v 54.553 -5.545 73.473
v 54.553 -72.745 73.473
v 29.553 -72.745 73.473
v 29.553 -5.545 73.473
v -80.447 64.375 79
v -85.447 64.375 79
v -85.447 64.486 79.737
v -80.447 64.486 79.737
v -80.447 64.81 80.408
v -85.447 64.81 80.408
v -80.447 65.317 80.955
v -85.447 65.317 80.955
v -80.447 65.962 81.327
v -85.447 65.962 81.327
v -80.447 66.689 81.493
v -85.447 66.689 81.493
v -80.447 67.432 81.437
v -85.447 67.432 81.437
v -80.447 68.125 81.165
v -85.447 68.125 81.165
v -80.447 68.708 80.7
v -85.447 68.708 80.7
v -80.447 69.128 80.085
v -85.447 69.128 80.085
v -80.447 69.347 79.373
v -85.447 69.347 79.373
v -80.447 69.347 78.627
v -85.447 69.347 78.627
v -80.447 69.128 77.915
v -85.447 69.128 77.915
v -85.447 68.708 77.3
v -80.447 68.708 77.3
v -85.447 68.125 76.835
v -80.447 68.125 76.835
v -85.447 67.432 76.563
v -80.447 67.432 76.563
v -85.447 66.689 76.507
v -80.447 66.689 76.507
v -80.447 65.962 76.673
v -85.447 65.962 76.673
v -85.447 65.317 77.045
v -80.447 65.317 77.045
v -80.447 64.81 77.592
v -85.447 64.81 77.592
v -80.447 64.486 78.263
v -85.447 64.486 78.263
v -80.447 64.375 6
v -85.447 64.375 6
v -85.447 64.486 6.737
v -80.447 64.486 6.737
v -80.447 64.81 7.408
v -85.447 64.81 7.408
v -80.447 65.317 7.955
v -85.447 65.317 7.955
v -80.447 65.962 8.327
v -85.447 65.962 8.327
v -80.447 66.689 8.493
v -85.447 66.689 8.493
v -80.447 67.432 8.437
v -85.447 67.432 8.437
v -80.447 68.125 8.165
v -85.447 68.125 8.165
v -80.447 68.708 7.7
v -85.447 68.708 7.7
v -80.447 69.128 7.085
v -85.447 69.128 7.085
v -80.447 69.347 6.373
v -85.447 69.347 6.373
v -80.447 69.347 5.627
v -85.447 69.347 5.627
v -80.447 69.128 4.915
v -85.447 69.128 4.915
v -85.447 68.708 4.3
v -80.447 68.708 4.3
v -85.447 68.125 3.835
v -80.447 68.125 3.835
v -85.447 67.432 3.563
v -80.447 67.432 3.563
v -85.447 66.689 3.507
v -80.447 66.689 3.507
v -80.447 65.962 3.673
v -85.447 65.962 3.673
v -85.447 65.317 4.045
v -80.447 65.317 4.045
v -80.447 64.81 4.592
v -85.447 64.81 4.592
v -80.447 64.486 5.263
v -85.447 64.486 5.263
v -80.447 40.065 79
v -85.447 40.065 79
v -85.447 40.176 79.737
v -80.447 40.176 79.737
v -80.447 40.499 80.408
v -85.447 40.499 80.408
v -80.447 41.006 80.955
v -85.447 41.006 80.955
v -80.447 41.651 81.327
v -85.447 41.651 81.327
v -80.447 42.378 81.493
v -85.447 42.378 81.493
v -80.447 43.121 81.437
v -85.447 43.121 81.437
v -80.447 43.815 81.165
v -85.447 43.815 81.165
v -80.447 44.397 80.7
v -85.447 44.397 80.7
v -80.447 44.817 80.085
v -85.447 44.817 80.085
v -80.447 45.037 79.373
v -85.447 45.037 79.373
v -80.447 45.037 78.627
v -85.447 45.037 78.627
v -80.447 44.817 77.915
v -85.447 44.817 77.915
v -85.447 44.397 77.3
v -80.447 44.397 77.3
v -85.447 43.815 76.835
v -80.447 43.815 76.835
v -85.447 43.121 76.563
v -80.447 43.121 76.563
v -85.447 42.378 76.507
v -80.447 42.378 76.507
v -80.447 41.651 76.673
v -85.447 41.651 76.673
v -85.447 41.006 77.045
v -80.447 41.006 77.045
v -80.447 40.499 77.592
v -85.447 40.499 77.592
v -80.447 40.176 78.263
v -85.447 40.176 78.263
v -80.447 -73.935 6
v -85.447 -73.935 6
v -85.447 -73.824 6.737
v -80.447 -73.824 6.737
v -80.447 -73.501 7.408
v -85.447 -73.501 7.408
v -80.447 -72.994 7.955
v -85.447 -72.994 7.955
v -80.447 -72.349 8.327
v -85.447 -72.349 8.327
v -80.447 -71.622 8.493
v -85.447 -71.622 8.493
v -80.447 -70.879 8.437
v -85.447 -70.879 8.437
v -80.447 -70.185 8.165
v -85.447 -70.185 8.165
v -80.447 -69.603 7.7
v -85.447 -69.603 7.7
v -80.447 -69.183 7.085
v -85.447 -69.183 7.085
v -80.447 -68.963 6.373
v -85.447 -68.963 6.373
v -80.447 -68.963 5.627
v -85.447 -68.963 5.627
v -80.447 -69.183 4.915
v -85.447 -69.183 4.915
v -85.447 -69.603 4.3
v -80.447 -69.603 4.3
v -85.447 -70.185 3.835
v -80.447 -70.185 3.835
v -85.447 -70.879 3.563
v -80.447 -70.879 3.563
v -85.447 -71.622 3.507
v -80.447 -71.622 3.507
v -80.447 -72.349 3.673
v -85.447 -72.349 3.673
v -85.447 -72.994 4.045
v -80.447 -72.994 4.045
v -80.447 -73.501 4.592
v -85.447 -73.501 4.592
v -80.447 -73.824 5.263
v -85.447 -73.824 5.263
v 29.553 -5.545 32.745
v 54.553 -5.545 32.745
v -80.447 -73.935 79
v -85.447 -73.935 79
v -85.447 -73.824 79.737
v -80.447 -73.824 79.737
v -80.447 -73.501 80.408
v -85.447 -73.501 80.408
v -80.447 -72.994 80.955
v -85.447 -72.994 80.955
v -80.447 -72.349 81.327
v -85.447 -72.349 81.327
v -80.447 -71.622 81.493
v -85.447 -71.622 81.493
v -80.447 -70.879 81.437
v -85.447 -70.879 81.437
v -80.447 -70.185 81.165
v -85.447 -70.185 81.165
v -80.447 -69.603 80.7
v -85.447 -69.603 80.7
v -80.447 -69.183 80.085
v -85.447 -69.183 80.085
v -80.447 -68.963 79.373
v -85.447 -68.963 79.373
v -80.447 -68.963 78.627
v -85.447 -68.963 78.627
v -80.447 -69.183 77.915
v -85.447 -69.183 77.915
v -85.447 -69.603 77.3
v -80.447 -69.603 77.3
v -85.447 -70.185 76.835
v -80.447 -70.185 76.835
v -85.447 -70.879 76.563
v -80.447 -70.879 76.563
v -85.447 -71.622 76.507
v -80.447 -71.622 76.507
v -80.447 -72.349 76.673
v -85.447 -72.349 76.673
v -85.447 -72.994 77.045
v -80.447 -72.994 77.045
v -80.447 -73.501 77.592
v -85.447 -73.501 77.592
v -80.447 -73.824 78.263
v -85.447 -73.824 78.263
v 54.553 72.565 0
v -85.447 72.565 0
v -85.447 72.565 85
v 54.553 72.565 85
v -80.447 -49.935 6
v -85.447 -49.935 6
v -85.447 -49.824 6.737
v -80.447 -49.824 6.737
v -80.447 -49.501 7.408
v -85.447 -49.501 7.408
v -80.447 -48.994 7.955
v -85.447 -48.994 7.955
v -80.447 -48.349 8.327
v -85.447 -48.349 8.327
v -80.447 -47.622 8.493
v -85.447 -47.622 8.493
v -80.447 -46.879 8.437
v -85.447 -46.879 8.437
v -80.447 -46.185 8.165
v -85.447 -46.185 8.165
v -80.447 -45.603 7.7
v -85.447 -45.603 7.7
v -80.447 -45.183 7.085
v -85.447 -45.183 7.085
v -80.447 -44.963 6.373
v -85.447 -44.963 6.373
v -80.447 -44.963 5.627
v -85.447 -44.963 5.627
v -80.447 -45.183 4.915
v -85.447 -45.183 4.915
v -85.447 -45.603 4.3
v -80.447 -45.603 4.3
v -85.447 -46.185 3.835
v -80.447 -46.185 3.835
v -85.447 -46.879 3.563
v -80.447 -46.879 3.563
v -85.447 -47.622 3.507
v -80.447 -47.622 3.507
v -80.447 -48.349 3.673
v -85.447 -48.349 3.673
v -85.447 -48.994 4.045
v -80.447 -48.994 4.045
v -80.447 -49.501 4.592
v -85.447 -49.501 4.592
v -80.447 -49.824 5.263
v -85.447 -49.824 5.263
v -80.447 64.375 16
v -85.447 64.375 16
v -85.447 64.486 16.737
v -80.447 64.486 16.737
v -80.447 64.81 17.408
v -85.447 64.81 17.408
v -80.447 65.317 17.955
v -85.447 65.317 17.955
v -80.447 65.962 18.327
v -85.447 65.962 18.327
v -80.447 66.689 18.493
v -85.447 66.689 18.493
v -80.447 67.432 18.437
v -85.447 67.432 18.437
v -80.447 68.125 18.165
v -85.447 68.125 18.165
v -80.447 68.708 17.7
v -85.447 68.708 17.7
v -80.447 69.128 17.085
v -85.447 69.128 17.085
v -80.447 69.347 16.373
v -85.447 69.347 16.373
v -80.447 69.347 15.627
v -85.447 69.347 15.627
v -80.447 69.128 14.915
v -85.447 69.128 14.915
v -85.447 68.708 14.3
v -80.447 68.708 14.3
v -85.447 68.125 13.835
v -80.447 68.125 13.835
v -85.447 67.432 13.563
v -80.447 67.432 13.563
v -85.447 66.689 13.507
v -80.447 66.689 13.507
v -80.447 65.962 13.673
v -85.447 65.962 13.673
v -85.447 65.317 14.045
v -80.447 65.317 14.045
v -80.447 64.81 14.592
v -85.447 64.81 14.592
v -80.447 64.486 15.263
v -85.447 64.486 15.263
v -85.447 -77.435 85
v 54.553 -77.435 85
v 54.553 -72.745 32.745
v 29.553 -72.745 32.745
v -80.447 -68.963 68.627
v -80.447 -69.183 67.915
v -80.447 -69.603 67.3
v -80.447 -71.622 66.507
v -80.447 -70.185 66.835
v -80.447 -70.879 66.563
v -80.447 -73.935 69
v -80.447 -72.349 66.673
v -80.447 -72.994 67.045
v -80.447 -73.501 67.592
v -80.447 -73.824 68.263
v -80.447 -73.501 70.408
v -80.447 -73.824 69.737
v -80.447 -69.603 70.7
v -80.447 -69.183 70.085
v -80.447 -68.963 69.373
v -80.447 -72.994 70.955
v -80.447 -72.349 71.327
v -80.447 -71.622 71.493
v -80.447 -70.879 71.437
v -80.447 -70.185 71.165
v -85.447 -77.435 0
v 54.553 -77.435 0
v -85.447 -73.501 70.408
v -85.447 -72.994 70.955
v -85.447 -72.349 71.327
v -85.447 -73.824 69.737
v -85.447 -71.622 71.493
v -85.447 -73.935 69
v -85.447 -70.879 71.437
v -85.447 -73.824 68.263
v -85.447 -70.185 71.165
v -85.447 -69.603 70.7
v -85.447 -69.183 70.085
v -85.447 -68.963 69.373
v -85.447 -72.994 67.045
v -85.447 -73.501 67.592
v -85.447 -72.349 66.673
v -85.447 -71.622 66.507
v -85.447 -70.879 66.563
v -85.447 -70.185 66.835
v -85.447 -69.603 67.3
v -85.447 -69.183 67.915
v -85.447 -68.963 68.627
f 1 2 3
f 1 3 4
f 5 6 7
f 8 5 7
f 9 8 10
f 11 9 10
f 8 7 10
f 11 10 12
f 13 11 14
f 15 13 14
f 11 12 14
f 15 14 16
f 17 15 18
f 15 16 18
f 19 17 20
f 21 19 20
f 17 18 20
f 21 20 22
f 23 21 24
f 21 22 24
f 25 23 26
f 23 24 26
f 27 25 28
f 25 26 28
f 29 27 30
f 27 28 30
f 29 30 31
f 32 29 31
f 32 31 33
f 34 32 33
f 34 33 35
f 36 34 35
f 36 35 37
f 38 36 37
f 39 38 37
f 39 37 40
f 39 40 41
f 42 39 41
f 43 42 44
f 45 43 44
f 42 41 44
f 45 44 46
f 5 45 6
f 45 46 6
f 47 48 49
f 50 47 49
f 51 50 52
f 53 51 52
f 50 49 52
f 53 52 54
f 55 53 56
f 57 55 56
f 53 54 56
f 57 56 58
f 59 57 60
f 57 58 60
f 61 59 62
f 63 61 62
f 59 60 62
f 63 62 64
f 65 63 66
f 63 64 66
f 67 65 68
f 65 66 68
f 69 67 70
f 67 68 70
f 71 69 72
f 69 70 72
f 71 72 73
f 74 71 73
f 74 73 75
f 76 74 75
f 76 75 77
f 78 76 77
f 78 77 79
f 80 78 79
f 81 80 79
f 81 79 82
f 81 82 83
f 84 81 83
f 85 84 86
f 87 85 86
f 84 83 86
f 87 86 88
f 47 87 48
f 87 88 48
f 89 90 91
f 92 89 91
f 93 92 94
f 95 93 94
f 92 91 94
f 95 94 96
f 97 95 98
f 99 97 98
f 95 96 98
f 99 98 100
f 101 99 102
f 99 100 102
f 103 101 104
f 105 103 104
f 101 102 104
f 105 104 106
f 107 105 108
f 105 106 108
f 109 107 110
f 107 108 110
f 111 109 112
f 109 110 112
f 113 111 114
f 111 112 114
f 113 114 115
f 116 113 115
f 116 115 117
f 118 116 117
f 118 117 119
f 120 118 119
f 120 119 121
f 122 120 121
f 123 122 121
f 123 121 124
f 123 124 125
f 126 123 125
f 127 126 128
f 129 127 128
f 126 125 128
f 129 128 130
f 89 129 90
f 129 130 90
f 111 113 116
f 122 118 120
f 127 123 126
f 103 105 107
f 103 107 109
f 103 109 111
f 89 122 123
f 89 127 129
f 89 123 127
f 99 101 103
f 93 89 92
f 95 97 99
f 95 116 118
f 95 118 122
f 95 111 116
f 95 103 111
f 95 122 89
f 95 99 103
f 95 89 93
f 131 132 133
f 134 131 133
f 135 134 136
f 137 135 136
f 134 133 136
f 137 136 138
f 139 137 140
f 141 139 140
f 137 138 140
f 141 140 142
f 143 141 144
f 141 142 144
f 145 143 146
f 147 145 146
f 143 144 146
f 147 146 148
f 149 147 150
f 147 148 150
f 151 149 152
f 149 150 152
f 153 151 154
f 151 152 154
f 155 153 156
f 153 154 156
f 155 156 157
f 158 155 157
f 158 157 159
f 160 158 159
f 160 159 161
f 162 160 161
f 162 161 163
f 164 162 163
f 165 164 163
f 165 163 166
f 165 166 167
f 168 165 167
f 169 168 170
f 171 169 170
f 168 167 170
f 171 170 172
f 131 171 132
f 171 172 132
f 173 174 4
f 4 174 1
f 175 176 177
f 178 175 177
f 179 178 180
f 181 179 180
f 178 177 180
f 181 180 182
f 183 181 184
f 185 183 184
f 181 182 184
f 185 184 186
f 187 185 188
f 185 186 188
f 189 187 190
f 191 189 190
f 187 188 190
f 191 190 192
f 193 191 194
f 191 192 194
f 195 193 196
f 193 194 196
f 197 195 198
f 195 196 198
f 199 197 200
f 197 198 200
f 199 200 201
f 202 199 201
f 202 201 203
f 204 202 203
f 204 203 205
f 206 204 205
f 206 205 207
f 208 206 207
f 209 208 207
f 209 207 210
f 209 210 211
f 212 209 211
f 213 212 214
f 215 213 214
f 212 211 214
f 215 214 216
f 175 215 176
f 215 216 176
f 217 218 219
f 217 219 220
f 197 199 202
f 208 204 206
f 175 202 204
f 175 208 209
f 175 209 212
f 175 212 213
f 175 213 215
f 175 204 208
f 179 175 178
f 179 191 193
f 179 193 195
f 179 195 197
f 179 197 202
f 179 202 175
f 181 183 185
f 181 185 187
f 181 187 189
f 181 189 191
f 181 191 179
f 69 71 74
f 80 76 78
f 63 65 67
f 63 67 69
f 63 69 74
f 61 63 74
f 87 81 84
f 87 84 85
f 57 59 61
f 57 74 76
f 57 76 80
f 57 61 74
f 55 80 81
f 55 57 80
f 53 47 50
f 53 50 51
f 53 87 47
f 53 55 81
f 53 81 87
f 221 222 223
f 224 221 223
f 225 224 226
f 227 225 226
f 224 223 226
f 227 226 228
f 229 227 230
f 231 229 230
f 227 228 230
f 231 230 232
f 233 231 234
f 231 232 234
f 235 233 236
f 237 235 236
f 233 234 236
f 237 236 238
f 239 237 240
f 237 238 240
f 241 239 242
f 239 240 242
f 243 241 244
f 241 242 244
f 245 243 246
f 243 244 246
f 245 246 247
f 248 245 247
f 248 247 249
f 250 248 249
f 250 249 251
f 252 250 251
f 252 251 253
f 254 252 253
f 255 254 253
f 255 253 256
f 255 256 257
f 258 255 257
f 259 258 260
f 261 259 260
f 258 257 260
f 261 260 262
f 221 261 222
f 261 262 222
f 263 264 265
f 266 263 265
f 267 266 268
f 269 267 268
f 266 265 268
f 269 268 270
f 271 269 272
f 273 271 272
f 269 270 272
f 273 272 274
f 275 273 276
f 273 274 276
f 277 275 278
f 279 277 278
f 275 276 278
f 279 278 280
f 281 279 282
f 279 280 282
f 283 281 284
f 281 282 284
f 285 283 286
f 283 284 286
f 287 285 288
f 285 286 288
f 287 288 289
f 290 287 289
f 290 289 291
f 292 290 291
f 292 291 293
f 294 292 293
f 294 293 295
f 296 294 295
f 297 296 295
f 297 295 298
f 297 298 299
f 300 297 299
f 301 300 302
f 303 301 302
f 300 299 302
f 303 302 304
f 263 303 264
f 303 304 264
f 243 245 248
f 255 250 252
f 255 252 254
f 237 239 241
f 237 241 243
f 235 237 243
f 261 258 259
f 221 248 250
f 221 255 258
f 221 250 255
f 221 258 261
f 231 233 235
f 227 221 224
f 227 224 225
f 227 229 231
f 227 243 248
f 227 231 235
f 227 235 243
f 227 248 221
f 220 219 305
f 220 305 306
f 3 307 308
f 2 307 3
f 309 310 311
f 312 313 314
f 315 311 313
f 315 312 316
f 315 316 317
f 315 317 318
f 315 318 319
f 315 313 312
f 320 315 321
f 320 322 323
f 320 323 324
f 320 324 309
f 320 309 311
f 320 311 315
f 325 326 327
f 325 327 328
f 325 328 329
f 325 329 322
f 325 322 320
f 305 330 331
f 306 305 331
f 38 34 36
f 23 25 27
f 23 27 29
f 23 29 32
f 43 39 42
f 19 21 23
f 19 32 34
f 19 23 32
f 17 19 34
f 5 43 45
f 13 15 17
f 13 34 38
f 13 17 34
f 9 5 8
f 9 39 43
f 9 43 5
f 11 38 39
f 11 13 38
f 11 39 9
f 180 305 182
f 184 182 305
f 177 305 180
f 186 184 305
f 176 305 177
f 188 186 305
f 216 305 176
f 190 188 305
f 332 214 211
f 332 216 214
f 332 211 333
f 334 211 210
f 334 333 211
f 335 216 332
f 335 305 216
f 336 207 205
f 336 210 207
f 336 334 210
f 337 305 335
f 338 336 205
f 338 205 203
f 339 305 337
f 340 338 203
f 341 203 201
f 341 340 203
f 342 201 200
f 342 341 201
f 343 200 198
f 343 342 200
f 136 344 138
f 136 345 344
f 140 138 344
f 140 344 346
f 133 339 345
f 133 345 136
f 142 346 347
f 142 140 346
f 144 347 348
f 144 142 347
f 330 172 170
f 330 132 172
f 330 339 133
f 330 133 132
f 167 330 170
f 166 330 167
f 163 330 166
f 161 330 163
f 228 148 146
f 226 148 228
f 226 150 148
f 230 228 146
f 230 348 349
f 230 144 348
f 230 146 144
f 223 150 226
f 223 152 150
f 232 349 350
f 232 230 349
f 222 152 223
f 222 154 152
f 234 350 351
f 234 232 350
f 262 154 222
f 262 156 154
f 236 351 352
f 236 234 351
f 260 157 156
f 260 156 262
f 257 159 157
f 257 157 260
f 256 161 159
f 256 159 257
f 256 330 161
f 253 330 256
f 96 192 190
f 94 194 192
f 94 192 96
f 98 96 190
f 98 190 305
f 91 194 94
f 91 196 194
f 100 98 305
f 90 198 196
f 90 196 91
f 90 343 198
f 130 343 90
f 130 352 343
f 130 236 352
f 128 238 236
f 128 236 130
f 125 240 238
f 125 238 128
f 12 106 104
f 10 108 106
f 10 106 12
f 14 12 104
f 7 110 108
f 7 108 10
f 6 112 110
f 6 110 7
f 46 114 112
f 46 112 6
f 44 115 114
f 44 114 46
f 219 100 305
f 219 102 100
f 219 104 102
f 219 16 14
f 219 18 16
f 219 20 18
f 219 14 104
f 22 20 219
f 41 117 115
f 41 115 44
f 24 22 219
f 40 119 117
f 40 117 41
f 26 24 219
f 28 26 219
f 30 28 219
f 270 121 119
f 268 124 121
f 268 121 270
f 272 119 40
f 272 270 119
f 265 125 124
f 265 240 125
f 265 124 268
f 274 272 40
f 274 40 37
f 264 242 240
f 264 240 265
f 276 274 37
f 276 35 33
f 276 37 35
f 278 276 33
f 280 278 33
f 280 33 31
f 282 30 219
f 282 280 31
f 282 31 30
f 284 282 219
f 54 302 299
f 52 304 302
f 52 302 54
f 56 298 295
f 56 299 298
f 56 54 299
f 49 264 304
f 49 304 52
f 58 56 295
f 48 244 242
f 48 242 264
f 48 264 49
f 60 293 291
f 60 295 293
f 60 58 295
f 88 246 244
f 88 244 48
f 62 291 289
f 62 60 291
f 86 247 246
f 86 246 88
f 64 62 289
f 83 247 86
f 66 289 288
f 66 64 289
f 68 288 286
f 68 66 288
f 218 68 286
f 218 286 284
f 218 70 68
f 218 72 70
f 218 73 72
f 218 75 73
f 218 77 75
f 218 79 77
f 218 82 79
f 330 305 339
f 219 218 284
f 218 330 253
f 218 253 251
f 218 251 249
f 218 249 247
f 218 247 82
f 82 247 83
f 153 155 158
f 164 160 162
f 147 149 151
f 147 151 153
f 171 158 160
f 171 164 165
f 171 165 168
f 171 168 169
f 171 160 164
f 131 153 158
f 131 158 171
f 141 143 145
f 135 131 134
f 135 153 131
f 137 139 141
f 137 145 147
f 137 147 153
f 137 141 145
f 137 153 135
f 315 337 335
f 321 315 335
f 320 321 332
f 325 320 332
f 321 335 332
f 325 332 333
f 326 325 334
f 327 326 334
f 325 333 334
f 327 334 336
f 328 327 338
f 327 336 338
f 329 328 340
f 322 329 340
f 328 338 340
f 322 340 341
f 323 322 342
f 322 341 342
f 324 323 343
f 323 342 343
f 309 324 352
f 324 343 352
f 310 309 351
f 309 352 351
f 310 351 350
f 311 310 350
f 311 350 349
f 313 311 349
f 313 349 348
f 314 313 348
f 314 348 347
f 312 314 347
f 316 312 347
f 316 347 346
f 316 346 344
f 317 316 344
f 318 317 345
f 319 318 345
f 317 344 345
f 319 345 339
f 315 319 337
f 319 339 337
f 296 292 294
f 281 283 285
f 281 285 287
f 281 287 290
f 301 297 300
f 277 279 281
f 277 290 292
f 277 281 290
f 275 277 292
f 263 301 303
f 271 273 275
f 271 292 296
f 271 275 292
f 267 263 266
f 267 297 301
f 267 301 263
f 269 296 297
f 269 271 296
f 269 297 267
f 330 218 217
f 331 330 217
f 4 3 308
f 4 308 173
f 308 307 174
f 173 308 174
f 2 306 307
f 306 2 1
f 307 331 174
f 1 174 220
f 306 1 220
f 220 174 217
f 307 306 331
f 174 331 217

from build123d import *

# Parameters (mm, degrees)
F0_W     = 140
F0_H     = 150
F1_DEPTH = 85
F2_W     = 67.2
F2_H     = 40.727277
F3_DEPTH = 25
F4_R     = 2.5
F5_DEPTH = 5


with BuildPart() as f1:
    # F0 (on Top) → F1 (new body)
    with BuildSketch(Plane.XY):
        with Locations((-15.446518, -2.435212)):
            Rectangle(F0_W, F0_H)
    extrude(amount=F1_DEPTH)

    # F2 (on face) → F3 (cut)
    with BuildSketch(Plane.YZ.offset(54.553482)):
        with Locations((-39.144876, 53.109092)):
            Rectangle(F2_W, F2_H)
    extrude(amount=-F3_DEPTH, mode=Mode.SUBTRACT)

    # F4 (on face) → F5 (cut)
    with BuildSketch(Plane(origin=(-85.446518, 0, 0), x_dir=(0, -1, 0), z_dir=(-1, 0, 0))):
        with Locations((-66.875344, 79)):
            Circle(F4_R)
        with Locations((-42.564788, 79)):
            Circle(F4_R)
        with Locations((-66.875344, 16)):
            Circle(F4_R)
        with Locations((-66.875344, 6)):
            Circle(F4_R)
        with Locations((47.435212, 6)):
            Circle(F4_R)
        with Locations((71.435212, 6)):
            Circle(F4_R)
        with Locations((71.435212, 79)):
            Circle(F4_R)
        with Locations((71.435212, 69)):
            Circle(F4_R)
    extrude(amount=-F5_DEPTH, mode=Mode.SUBTRACT)


solid = f1.part
